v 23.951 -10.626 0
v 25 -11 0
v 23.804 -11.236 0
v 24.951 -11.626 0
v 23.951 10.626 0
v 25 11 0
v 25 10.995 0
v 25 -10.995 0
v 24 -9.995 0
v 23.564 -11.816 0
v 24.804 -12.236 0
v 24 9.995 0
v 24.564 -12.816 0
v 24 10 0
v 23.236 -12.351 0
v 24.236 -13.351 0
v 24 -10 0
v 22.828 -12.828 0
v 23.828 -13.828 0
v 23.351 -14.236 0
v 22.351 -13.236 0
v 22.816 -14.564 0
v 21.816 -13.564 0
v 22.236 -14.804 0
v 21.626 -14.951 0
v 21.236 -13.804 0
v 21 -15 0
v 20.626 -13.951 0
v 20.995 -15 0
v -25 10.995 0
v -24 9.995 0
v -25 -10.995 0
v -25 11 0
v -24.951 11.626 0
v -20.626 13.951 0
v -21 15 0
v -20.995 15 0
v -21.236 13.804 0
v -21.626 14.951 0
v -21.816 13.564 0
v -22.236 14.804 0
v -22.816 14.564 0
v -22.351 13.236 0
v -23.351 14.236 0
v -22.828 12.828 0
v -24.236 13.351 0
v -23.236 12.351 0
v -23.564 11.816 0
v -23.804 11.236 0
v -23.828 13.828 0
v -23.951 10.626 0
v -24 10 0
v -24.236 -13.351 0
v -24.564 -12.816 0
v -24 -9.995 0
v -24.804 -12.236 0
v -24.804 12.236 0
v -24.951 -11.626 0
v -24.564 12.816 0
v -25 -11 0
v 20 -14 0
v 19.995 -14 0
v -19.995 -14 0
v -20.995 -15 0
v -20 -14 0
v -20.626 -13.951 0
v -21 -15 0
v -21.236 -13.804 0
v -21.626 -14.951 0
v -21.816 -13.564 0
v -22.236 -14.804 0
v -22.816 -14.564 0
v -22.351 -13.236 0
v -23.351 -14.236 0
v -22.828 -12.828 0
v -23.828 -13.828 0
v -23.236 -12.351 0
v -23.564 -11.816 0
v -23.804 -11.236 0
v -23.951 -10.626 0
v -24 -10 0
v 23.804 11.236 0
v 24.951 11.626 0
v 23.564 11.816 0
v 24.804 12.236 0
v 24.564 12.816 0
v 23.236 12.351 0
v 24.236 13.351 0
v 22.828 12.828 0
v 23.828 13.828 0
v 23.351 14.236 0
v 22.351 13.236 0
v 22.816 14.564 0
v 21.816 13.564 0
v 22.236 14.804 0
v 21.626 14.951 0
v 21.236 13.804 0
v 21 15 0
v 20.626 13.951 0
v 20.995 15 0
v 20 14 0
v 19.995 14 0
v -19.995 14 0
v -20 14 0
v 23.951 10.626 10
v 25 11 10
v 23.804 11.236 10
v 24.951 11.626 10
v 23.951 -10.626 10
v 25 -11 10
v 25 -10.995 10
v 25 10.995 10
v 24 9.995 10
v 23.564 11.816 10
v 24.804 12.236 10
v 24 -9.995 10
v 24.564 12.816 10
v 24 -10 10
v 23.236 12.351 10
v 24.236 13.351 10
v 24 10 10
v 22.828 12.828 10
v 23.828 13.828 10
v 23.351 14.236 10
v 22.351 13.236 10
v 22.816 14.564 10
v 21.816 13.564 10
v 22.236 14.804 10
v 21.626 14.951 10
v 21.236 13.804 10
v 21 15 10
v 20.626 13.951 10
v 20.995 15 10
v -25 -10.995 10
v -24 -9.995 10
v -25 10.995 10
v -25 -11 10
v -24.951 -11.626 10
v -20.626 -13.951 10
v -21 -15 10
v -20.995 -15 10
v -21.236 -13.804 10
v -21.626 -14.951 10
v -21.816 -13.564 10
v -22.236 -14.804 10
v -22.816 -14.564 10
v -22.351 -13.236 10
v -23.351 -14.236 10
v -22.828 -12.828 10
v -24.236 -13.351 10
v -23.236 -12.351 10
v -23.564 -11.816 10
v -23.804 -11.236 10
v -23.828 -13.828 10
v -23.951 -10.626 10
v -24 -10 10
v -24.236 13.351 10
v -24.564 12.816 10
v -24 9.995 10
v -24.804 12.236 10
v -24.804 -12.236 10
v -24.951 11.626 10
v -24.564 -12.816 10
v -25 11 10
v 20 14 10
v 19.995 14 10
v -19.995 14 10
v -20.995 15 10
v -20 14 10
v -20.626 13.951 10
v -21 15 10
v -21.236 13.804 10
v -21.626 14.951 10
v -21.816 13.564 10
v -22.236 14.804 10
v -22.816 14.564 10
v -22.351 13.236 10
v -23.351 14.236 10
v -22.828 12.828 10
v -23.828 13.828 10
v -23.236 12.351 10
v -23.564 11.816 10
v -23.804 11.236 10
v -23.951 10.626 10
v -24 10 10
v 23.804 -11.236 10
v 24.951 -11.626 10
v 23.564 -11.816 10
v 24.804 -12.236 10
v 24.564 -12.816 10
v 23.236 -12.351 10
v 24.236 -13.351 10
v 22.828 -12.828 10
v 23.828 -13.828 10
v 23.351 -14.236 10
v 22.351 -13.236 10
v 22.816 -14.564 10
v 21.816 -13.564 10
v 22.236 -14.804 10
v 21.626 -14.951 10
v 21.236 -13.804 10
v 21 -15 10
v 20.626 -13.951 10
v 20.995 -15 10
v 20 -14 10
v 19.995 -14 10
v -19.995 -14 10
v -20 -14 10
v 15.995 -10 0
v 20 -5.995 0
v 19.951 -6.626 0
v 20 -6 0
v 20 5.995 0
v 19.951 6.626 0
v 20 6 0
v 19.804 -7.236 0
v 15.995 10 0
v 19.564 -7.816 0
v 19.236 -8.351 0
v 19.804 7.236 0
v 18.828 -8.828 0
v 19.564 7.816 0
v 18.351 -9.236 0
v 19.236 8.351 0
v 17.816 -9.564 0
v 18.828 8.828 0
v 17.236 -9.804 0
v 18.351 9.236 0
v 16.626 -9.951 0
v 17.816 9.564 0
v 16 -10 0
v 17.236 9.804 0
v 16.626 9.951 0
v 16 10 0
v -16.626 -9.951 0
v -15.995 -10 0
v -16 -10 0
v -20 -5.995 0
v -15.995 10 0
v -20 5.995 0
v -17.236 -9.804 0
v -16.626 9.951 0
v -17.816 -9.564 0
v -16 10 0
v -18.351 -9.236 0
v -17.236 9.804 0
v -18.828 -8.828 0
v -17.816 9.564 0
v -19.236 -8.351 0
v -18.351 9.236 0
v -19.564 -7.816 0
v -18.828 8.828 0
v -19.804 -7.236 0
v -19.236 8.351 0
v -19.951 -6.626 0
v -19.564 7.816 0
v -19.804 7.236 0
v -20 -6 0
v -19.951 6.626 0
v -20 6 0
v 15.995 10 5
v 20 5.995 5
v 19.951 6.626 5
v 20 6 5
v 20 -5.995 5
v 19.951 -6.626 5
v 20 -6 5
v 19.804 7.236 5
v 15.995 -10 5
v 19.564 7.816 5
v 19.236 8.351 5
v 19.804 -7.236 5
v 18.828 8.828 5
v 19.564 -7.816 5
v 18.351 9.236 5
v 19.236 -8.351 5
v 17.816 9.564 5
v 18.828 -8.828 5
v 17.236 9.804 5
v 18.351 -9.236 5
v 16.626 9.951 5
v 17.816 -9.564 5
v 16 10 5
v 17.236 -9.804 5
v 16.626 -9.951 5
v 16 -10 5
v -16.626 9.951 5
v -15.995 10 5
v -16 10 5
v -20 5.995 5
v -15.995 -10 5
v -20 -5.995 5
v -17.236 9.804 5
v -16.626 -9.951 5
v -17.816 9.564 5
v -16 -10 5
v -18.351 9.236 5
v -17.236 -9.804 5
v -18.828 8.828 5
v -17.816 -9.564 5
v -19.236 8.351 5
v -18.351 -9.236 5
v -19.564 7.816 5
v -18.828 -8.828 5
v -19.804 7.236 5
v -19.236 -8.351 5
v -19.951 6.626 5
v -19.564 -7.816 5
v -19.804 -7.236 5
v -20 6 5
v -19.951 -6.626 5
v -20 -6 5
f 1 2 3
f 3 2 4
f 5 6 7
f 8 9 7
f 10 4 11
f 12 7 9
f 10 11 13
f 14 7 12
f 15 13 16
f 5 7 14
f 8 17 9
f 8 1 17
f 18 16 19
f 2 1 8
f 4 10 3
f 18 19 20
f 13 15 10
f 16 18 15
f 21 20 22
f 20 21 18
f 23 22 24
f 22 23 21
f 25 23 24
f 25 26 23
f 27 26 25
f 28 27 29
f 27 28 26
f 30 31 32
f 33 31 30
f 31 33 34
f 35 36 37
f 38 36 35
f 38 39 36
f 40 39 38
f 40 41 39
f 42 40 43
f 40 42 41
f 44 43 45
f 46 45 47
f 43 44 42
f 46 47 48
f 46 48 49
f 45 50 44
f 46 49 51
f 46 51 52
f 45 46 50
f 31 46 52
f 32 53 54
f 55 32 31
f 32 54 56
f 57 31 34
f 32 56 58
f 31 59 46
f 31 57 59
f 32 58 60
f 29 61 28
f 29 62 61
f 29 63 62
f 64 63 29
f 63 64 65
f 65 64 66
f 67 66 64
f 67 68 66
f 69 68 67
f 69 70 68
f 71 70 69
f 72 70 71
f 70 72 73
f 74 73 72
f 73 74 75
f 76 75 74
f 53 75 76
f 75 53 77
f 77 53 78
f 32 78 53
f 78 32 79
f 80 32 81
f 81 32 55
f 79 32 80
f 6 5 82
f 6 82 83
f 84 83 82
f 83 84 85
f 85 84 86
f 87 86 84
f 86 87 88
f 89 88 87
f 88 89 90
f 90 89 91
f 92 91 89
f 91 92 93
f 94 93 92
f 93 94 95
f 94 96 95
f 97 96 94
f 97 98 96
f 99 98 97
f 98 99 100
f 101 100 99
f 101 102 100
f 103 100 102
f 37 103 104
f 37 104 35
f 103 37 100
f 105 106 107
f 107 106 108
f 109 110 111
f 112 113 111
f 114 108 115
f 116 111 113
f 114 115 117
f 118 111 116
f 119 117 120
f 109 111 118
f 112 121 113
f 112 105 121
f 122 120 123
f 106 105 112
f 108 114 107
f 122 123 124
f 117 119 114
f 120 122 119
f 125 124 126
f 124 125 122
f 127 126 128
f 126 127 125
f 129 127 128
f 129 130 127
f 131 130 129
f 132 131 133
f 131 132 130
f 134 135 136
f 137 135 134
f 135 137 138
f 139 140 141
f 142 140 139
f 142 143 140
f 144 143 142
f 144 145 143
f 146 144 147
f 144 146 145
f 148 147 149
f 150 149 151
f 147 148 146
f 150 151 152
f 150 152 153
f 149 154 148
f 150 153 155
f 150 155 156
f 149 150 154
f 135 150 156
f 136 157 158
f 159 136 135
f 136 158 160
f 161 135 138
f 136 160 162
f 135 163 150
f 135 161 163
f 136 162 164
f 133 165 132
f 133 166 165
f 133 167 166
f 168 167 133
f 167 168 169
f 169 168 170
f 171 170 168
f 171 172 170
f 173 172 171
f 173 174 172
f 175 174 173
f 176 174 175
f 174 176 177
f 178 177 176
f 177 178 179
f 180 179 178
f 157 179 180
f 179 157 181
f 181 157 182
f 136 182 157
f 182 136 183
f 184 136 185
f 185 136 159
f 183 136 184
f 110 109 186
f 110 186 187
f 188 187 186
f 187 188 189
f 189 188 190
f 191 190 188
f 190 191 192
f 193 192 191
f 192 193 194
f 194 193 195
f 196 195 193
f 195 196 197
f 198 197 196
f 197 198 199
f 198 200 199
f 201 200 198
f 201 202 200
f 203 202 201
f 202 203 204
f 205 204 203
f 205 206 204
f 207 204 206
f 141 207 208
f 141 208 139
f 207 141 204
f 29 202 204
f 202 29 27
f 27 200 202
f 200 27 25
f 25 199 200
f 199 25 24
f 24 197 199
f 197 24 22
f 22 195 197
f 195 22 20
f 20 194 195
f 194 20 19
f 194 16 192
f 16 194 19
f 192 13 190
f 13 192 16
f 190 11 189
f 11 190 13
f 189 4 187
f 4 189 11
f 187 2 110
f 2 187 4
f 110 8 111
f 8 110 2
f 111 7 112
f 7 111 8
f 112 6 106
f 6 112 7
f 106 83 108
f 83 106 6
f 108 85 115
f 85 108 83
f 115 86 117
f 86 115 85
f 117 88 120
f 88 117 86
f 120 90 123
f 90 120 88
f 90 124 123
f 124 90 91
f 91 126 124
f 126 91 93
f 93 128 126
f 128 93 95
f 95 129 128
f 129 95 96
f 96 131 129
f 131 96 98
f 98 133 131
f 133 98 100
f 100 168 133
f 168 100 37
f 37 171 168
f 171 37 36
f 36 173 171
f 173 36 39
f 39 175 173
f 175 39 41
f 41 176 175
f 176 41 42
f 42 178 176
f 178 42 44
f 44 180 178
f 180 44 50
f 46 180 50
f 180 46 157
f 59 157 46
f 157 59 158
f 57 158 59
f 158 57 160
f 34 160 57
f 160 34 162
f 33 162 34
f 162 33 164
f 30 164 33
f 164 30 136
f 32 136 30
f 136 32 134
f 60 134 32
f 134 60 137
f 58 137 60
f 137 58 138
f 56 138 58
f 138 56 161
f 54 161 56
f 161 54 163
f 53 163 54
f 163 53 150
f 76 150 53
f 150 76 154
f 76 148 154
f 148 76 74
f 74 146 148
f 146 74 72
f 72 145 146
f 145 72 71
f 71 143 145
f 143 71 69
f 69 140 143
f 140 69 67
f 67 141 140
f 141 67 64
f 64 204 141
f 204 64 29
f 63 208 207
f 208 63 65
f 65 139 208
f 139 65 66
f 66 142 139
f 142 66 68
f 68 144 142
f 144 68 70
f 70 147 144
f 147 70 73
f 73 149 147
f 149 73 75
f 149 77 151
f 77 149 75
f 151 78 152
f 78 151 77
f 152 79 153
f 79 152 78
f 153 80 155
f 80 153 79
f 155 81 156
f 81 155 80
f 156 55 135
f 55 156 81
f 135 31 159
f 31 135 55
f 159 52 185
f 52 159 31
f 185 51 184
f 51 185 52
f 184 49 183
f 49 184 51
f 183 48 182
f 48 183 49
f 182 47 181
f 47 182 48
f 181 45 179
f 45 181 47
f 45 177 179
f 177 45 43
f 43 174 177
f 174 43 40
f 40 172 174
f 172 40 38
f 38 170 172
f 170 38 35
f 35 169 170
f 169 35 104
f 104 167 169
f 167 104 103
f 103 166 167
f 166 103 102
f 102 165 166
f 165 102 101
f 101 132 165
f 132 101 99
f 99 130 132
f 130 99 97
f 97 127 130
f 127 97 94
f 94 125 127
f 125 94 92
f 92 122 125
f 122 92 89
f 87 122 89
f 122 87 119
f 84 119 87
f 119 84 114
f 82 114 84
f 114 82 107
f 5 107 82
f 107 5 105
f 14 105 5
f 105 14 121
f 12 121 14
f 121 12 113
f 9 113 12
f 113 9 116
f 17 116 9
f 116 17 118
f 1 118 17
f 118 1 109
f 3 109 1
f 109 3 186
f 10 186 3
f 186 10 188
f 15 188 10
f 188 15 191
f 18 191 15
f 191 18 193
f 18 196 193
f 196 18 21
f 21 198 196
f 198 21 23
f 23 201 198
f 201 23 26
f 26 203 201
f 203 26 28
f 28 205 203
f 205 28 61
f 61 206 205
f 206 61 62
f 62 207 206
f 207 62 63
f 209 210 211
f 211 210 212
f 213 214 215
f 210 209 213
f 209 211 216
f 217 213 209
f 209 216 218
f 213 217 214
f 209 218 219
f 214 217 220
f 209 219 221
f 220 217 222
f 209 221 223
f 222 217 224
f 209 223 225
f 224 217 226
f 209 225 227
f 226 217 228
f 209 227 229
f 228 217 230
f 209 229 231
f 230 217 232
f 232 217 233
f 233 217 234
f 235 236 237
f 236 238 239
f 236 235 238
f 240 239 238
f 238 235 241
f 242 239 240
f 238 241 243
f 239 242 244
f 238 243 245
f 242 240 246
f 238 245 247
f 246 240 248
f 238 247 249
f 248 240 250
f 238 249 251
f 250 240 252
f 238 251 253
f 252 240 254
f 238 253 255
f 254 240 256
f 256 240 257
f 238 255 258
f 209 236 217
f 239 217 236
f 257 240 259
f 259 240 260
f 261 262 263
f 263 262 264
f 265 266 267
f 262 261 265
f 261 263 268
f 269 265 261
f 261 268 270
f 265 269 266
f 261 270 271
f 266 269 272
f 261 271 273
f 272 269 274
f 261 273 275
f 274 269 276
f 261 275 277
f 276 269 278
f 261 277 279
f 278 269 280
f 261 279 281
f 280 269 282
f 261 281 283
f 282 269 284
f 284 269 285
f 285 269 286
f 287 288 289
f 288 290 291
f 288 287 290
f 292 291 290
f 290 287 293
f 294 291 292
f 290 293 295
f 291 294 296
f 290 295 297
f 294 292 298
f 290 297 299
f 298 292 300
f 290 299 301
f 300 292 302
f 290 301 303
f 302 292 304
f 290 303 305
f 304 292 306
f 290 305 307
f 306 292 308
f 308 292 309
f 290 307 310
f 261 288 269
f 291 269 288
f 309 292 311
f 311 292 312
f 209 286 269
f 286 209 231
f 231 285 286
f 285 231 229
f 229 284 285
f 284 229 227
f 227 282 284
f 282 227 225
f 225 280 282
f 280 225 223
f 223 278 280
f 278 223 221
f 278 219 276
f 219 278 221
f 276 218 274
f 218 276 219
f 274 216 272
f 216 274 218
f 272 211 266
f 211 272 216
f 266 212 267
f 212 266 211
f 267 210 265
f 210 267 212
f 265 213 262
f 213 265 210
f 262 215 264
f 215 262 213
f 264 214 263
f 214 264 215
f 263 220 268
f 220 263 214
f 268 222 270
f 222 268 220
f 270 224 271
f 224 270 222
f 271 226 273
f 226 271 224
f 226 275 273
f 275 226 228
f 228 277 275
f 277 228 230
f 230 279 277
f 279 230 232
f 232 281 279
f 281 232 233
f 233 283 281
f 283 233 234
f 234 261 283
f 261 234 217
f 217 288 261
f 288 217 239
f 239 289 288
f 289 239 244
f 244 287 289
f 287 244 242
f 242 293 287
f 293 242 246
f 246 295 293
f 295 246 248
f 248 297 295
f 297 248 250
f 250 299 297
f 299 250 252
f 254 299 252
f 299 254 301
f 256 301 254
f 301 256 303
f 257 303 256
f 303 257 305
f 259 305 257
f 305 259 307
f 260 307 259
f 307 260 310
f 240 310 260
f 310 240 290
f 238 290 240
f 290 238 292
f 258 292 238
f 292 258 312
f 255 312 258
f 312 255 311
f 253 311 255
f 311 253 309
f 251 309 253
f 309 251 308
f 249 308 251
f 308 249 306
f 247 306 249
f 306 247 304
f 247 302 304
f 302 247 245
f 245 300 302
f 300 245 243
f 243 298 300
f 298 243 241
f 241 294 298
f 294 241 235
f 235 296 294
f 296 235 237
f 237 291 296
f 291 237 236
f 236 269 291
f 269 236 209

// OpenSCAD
siz = [50,30,10];
d = 8;
hollow_border = 2;
//fillet(r=3, h=2, center = true, offs=5);
//fillet2D(r=3, h=2, center = true, offs=5);
rounded_cube(d=8, siz = [50,30,10], hollow_border=2 );
rounded_cube(d=8, siz = [40,20,5] );
//rounded_square(d=8, siz = [50,30,10], hollow_border=2 );
//rounded_square(d=8, siz = [40,20,5] );
//translate([0,0,10])
//    if(hollow_border != 0) rounded_cube(d=d, siz = [siz[0]-hollow_border,siz[1]-hollow_border,siz[2]-hollow_border]);
//rounded_cube(d=8, siz = [50,30,10] );
module fillet(r, h, center = true, offs=0) 
{
  disp = (center)?r/2:0;

  translate([disp, disp, 0])

    difference() 
    {
      translate([-offs/2,-offs/2,0])
      cube([r + 0.01+offs, r + 0.01+offs, h], center = true);

      translate([r/2, r/2, -0.01])
        cylinder(r = r, h = h + 2, center = true, $fn=100);

    }
}

module rounded_cube(d=20, siz = [1,1,1], hollow_border = 0)
{
  linear_extrude(height=siz[2])
rounded_square(d=d, siz = siz, hollow_border=hollow_border );
}

module rounded_square(d=20, siz = [1,1,1], hollow_border = 0)
{
  difference()
  {
    square([siz[0],siz[1]], center = true);
    union()
    {
    if(hollow_border != 0) rounded_square(d=d, siz = [siz[0]-hollow_border,siz[1]-hollow_border,siz[2]+hollow_border]);
      for(n=[0:3]) 
        translate([((n%3 == 0)? -1:1)*siz[0]/2,((n >1)? 1:-1)*siz[1]/2,0]) rotate([0,0,n*90])fillet2D(r=d/2, h=1.5*siz[2], center = true, offs=1);
    }
  }
}

module fillet2D(r, h, center = true, offs=0, fn=40) 
{
  disp = (center)?r/2:0;
  translate([disp, disp, 0])
    difference() {
      translate([-offs/2,-offs/2,0])
      square([r + 0.01+offs, r + 0.01+offs], center = true);

      translate([r/2, r/2, -0.01])
        circle(r = r, $fn=fn);
    }
}
